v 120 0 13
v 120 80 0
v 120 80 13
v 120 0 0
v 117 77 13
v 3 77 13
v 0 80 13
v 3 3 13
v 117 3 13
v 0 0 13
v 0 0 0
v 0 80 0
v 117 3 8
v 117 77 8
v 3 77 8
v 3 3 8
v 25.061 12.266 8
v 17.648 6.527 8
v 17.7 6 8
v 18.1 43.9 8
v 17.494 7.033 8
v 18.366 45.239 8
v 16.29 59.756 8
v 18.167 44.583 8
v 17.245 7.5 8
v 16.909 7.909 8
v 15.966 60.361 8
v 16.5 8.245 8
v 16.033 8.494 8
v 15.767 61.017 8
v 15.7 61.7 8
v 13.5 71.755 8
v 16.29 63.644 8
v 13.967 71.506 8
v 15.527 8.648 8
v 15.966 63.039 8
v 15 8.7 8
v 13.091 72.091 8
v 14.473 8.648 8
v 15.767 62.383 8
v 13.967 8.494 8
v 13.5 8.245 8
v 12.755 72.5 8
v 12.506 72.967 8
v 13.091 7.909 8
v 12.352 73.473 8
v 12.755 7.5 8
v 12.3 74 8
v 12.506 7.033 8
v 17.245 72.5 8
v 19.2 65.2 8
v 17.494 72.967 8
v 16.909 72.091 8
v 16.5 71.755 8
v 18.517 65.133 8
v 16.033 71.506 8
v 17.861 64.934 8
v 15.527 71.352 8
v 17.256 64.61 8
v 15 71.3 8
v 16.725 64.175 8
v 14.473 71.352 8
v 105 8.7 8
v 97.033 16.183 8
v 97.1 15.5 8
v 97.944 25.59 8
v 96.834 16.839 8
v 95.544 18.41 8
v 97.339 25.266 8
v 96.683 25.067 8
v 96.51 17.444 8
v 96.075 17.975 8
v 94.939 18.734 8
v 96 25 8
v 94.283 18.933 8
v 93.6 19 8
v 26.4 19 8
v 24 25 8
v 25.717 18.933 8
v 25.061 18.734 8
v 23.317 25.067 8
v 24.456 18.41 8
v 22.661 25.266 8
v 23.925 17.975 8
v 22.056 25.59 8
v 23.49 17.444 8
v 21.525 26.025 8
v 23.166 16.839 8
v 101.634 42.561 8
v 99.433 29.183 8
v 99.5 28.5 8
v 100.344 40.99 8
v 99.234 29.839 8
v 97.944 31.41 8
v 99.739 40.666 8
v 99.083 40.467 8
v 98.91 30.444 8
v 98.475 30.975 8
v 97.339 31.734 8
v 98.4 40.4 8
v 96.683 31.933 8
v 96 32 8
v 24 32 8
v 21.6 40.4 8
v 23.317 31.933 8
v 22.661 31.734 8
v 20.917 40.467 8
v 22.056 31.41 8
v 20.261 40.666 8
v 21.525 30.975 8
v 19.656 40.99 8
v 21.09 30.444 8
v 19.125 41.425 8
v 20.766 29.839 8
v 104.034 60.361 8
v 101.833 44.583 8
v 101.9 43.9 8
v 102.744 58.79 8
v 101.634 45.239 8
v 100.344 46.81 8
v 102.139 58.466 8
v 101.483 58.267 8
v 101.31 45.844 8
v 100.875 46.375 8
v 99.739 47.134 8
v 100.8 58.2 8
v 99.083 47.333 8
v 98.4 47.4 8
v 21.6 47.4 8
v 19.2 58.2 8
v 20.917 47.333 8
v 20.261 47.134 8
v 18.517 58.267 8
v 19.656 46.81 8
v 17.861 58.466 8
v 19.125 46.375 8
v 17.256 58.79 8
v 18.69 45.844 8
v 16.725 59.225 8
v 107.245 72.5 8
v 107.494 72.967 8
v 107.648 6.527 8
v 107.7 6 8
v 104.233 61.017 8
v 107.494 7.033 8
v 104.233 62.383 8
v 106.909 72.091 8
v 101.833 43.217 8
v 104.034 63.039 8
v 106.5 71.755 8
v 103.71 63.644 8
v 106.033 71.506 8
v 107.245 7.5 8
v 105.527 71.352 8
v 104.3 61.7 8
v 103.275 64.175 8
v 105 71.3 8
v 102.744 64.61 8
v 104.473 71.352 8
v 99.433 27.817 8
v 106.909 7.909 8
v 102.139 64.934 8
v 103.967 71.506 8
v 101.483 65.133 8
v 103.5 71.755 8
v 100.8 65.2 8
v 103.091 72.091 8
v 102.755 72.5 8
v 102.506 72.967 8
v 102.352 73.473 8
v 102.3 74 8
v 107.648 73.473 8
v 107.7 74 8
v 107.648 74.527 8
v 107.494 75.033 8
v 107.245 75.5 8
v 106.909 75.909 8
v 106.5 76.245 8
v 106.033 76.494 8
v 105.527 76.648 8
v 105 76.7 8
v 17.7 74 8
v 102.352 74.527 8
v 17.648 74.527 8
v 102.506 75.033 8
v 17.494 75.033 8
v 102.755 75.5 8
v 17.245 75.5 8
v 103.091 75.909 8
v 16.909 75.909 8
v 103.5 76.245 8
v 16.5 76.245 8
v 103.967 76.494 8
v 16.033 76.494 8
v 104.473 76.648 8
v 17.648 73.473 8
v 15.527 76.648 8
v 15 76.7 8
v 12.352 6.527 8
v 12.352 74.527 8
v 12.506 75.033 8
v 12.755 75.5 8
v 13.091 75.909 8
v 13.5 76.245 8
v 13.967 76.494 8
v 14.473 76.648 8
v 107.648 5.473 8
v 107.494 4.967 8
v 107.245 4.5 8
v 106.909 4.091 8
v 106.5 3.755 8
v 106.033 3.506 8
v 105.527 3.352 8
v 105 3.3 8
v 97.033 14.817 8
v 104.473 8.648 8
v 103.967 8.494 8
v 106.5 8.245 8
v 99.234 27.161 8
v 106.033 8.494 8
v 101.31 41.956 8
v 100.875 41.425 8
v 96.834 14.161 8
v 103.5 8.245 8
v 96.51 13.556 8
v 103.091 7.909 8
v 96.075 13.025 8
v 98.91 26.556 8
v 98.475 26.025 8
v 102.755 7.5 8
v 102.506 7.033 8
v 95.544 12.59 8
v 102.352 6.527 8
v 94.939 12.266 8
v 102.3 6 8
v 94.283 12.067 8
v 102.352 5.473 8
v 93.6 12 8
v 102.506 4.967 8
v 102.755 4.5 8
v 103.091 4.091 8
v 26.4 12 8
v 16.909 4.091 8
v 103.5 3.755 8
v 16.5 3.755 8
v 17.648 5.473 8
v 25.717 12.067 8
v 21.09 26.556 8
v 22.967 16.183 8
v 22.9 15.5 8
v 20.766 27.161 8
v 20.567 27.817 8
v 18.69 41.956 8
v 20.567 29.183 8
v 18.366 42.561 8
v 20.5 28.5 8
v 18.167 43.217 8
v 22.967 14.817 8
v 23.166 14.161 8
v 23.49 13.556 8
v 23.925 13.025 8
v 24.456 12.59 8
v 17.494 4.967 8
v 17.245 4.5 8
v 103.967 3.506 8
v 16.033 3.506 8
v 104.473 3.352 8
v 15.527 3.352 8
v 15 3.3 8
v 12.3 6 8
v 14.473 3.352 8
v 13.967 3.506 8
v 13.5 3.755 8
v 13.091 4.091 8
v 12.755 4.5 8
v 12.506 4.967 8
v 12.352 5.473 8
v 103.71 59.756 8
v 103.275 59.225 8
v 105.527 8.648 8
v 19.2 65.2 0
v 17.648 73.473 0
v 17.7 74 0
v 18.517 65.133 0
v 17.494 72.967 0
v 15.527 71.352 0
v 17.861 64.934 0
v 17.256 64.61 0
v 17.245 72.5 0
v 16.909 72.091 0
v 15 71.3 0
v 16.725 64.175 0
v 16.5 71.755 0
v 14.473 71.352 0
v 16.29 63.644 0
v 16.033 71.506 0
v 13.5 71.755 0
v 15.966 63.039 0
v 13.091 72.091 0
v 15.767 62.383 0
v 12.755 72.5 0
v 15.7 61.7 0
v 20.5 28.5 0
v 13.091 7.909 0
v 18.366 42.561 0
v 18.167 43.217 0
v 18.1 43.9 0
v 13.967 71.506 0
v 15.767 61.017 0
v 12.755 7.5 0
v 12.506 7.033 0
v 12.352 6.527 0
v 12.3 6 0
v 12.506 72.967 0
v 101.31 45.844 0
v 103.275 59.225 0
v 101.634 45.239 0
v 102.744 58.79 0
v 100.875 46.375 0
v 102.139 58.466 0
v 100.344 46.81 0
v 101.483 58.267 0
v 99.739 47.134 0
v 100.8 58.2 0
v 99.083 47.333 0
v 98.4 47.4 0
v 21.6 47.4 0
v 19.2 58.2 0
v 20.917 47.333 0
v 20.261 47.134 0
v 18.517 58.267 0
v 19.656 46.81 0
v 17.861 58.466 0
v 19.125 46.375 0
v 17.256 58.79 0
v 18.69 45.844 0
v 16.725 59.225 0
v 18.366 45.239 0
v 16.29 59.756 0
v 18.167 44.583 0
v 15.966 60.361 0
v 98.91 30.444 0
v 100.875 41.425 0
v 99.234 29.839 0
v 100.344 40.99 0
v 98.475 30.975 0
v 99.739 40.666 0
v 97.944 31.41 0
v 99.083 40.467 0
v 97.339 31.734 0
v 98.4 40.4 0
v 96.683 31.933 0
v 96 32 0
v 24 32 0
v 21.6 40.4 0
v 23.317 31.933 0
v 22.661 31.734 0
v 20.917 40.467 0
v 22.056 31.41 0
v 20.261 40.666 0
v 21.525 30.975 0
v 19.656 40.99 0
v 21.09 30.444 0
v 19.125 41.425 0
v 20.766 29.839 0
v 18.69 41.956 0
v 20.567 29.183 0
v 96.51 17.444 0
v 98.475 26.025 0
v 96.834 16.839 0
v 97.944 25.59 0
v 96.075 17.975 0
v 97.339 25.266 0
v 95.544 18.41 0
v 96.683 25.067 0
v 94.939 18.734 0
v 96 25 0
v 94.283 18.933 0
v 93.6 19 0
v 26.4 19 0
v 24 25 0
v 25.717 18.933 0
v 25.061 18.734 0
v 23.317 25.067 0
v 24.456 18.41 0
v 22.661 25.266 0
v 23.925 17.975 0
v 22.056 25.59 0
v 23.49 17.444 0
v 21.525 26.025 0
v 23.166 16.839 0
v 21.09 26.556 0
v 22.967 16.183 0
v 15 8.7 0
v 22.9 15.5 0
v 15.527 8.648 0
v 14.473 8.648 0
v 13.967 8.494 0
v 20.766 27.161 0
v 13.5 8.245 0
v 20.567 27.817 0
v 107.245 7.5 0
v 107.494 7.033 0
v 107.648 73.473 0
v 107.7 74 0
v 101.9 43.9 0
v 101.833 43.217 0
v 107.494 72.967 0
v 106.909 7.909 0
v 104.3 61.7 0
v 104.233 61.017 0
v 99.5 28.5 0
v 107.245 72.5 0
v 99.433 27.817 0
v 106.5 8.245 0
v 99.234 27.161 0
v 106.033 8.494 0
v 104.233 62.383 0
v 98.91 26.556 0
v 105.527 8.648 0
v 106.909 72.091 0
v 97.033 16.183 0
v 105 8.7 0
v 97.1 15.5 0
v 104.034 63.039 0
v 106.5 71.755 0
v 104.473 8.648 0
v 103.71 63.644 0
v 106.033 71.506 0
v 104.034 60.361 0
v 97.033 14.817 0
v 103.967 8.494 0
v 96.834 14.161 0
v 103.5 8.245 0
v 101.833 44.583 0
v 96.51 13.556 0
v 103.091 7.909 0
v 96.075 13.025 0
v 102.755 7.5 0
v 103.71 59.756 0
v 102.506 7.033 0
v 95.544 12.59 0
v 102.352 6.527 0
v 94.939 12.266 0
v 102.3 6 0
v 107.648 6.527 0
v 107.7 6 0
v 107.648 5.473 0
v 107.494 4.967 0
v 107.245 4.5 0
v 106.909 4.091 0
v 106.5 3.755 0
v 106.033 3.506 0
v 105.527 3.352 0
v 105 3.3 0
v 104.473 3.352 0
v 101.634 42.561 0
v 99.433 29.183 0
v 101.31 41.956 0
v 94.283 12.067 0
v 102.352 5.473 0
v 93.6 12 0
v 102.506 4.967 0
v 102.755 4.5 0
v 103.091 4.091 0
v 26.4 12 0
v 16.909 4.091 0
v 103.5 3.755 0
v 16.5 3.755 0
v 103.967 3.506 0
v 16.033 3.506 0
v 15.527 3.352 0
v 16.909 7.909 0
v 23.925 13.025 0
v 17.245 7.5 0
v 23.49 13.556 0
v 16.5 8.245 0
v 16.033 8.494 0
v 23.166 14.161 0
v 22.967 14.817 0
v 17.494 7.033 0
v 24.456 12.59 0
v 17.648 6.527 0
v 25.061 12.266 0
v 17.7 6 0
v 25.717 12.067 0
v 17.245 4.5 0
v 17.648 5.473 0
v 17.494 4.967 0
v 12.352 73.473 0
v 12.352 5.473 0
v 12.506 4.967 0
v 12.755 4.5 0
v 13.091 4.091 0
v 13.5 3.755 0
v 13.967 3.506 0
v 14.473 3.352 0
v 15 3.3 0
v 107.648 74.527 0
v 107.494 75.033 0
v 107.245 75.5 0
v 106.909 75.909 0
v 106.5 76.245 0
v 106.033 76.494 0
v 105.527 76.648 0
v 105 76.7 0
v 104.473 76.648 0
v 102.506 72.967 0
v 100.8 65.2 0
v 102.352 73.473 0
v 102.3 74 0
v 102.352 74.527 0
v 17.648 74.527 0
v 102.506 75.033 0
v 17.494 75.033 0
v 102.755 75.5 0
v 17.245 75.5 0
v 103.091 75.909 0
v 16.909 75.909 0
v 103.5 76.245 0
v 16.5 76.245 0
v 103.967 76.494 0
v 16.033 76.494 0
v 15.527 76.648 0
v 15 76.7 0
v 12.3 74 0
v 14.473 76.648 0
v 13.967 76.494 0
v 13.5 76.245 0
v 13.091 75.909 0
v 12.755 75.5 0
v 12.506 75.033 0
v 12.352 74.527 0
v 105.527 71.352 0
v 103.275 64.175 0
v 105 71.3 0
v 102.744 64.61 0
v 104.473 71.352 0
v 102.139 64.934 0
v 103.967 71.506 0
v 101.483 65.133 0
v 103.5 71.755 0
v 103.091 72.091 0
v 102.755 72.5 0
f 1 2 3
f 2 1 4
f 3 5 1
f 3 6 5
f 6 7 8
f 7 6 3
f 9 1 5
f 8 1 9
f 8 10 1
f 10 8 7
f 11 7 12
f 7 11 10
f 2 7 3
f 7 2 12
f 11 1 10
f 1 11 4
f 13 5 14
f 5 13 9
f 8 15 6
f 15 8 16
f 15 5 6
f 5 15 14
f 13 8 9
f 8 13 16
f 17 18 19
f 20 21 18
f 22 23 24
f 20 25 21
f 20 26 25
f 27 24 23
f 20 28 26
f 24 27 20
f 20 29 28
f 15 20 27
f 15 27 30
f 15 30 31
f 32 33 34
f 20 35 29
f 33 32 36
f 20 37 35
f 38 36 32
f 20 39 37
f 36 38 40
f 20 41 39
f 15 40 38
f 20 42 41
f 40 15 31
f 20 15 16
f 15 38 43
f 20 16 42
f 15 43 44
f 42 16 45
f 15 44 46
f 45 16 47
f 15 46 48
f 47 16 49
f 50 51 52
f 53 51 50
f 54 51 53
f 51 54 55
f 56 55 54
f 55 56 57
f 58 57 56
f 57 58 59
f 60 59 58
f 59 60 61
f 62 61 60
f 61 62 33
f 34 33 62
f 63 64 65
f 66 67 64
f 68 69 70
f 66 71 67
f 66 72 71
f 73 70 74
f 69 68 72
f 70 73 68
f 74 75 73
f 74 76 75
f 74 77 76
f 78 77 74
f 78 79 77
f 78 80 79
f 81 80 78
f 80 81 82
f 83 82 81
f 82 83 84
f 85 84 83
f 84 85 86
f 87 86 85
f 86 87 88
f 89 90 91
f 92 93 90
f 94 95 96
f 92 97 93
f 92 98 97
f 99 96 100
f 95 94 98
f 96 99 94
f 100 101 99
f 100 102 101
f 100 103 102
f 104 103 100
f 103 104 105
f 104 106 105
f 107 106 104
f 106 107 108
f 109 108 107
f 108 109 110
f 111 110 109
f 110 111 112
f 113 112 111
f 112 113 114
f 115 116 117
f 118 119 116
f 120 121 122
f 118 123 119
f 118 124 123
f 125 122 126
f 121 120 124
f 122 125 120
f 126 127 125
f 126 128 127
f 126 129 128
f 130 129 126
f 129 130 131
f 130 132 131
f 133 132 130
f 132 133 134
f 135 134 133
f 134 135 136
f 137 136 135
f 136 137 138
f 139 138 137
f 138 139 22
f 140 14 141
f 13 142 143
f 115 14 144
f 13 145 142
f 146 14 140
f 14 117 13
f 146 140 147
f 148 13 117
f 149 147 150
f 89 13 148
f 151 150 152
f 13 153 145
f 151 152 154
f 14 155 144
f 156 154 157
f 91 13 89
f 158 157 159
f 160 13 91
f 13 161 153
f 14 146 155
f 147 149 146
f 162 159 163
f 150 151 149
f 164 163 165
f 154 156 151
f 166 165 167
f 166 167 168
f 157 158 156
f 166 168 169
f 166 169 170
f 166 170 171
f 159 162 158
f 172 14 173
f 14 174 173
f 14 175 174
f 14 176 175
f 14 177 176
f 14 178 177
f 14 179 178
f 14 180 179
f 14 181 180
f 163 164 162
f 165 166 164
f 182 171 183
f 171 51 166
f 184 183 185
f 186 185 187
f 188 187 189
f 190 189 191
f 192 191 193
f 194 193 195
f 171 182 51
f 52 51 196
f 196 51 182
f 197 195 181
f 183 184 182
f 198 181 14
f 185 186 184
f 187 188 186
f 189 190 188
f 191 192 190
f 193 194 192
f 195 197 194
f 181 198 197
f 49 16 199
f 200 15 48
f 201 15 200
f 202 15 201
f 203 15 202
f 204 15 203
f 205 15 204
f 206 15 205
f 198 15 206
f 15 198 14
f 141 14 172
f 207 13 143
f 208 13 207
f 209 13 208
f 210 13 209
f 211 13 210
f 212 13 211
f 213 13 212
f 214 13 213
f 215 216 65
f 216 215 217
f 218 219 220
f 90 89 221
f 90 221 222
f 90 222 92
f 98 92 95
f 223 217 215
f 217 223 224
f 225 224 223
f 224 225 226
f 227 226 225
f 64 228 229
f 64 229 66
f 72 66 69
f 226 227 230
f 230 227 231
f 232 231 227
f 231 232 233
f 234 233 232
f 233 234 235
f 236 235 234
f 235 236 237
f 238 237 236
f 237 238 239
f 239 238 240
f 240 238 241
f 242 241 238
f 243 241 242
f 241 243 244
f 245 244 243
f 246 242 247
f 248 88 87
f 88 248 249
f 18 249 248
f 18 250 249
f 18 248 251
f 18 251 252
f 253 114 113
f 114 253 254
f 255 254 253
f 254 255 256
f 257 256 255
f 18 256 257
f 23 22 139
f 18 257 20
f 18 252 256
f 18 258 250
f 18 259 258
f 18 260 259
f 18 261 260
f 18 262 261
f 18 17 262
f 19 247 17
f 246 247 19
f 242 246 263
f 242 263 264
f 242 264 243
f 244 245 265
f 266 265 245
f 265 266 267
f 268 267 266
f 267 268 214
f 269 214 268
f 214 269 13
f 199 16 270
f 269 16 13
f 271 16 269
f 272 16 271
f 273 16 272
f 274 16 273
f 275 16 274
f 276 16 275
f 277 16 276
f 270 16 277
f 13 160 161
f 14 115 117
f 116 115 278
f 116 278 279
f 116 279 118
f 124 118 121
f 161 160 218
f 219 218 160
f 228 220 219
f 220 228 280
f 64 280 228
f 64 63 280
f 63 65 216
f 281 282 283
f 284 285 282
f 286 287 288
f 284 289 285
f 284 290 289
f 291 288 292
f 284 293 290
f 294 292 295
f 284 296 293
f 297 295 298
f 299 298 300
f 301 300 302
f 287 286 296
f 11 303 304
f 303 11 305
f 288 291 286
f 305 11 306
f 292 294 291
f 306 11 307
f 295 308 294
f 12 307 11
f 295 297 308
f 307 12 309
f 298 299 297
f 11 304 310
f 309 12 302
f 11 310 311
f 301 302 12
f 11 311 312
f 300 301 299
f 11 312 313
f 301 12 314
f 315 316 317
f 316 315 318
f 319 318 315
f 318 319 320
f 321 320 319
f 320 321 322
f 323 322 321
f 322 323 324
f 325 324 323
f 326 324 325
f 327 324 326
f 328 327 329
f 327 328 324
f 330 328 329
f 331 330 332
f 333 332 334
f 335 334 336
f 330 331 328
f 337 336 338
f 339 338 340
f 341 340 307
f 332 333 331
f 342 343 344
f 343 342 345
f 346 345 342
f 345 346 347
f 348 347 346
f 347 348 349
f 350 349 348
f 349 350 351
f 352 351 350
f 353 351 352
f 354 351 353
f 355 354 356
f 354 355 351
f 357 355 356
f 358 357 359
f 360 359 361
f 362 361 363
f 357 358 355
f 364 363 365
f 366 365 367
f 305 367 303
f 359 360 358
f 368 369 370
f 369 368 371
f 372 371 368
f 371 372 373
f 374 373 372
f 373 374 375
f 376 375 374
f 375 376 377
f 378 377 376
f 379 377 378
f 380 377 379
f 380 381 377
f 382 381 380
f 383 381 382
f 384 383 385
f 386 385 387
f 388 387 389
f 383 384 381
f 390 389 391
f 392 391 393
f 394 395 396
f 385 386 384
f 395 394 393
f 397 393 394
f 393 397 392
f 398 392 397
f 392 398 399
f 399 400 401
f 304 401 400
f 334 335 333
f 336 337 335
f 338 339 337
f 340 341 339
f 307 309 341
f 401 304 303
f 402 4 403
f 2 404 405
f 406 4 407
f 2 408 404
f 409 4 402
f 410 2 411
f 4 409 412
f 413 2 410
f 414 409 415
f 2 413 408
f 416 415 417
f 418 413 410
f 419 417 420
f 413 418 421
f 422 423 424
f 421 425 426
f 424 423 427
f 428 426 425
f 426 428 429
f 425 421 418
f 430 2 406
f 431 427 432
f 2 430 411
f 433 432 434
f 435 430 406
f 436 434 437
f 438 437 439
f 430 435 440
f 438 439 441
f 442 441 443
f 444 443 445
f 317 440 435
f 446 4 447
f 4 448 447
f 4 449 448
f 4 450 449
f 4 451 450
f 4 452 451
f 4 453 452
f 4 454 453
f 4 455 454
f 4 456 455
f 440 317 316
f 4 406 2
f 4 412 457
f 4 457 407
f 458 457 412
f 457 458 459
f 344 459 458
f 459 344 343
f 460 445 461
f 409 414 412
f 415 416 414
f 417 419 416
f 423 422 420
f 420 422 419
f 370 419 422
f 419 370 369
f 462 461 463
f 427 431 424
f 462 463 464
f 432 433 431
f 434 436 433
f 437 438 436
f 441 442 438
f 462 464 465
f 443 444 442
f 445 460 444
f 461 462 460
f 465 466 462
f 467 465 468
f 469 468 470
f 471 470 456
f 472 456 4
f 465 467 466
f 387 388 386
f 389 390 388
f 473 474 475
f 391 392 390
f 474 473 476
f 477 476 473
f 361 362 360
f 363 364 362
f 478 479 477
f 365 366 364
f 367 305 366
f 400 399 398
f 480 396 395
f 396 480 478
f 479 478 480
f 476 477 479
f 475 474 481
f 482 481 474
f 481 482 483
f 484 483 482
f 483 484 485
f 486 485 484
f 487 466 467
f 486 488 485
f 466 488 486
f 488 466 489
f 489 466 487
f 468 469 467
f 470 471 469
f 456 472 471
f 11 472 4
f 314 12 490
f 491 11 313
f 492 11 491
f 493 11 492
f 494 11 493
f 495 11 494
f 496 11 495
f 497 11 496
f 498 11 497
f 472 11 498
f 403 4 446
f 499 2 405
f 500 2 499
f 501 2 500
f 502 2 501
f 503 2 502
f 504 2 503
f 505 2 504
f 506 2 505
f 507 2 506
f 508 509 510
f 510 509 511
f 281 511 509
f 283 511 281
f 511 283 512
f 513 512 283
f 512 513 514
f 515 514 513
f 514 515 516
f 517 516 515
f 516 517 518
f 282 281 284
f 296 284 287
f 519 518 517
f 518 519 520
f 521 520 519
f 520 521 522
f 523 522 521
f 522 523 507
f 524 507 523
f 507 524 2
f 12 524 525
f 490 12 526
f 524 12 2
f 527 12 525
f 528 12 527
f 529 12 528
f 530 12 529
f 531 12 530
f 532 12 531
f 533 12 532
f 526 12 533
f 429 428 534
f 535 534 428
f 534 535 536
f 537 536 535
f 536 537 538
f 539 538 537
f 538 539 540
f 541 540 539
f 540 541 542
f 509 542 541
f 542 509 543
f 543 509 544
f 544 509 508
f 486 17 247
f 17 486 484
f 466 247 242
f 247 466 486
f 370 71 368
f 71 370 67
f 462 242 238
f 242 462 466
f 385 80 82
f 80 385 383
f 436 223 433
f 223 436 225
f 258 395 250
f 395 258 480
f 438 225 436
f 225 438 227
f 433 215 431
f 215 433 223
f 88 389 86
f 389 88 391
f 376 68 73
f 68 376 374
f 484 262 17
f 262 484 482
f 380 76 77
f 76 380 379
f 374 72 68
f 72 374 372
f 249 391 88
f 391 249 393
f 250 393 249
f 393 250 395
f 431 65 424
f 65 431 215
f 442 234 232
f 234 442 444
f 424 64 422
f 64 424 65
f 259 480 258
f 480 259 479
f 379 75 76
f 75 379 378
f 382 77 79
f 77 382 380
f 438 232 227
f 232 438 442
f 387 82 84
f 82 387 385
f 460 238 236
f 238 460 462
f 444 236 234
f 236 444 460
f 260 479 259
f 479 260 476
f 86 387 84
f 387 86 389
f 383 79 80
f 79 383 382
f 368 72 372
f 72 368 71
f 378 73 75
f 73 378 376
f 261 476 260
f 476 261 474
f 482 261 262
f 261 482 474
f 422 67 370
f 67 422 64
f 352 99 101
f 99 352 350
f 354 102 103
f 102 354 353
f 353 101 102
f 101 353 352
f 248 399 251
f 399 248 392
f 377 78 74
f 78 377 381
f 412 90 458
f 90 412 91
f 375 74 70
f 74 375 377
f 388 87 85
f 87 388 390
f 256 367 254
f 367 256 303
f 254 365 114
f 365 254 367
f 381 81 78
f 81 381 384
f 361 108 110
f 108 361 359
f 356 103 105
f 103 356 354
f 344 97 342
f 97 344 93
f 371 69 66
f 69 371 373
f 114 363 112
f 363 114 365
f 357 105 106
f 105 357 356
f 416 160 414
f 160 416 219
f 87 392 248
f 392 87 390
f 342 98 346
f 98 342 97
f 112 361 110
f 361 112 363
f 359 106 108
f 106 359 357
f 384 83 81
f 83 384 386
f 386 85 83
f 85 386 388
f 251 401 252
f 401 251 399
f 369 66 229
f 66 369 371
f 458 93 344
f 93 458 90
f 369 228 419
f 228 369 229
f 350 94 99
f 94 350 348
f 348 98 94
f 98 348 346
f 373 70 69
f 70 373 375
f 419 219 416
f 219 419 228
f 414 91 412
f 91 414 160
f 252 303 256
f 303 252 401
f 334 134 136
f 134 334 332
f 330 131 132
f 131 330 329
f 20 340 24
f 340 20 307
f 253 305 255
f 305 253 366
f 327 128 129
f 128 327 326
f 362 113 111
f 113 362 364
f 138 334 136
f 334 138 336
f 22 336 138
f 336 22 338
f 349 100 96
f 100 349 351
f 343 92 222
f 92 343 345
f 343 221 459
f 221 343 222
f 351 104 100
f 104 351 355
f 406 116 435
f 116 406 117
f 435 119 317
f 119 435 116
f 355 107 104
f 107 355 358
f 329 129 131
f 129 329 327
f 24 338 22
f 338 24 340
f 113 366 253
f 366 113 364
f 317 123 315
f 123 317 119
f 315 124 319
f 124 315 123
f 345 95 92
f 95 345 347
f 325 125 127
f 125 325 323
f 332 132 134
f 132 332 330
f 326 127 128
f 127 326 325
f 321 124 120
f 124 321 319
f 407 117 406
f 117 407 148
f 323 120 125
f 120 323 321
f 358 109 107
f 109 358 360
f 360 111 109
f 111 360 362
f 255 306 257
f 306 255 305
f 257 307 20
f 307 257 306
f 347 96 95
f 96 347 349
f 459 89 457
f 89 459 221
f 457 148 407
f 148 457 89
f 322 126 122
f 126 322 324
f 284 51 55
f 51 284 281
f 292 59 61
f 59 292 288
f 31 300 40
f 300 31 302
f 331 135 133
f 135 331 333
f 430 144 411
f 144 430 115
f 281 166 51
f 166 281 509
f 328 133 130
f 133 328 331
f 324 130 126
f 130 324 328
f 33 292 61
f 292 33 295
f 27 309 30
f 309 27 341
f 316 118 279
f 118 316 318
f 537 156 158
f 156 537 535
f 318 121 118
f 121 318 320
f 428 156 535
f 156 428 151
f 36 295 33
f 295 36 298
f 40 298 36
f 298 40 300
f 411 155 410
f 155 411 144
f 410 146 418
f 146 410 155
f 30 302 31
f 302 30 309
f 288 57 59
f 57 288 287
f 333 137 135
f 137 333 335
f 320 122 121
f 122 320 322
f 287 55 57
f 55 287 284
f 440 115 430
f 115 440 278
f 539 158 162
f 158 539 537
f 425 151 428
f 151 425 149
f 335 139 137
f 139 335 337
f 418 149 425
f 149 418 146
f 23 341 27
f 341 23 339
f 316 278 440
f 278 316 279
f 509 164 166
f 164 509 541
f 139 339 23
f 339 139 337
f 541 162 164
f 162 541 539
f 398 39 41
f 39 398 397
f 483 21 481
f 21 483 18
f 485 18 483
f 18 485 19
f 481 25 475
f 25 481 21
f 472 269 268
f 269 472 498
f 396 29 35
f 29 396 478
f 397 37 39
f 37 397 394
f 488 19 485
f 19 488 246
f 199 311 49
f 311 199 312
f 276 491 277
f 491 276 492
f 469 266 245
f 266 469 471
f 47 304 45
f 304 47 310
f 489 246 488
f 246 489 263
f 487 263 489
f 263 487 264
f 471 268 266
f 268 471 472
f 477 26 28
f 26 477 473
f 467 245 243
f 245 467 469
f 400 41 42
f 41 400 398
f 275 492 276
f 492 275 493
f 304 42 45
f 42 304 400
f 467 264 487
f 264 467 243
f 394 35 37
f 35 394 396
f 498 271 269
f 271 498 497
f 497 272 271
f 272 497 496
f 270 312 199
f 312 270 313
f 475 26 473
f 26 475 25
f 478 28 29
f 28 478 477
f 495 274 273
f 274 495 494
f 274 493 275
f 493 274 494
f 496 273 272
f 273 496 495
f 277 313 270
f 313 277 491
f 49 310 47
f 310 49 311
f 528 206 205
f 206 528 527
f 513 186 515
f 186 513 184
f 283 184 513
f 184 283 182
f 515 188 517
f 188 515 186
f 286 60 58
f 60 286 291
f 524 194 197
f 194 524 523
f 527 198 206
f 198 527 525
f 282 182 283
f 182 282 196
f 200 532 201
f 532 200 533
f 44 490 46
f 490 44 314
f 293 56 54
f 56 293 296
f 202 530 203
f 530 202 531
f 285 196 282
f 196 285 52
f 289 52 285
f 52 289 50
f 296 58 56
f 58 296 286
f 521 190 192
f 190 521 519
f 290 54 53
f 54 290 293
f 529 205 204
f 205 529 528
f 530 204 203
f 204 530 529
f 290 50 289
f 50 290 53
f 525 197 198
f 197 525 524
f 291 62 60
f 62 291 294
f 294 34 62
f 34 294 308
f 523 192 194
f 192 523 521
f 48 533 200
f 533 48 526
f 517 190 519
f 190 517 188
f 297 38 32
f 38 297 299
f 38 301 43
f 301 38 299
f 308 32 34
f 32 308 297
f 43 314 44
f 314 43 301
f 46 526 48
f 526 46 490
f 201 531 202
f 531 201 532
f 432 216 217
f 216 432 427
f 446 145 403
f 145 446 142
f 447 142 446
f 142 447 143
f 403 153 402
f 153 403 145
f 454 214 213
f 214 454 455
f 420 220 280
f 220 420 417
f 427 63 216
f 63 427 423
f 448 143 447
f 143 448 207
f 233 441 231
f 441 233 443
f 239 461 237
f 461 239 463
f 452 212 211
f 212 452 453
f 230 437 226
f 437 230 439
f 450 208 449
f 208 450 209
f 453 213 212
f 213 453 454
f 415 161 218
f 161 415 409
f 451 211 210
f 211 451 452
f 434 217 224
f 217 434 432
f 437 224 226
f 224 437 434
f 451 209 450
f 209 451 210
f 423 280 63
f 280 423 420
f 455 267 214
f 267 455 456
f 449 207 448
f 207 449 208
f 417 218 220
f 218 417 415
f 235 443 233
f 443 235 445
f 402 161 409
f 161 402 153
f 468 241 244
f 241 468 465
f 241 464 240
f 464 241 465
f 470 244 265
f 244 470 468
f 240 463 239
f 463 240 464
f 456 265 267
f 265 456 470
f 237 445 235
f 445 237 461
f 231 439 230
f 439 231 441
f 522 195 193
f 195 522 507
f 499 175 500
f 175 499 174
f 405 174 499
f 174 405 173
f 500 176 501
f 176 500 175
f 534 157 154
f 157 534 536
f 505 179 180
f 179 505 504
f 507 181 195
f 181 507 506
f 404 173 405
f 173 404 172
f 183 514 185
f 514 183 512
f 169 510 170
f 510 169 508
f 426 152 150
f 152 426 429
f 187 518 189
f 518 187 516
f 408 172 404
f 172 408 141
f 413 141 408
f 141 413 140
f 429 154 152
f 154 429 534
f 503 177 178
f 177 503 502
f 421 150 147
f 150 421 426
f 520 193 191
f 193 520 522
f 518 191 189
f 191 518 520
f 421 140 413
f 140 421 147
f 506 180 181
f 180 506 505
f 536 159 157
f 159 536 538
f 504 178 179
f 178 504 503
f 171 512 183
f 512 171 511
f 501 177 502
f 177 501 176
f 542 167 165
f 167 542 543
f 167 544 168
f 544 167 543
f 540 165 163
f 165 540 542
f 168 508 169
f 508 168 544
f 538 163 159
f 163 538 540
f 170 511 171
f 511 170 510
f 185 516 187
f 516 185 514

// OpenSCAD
$fn = 32;

// ----------------------------------------------------------------------
// Slotted panel: 120 x 80 mm, 4 ряда of slots
// ----------------------------------------------------------------------

// --- parameters (mm) ---
panel_w = 120;            // panel width
panel_d = 80;             // panel depth
thick = 8;                // panel thickness
slot_w = 7;               // slot width
pitch0 = 13;              // first row pitch
pitch_step = 2.4;         // pitch increase per row
margin = 12;              // margin around the slot field
rows = 4;                 // number of slot rows
mount_d = 5.4;            // mounting holes
mount_x = 45;             // mounting hole offset
rim_h = 13;               // rim height
rim_t = 3;                // rim wall thickness

difference() {
  union() {
    cube([panel_w, panel_d, thick]);
    translate([0, 0, thick - 1]) difference() {
      cube([panel_w, panel_d, rim_h - thick + 1]);
      translate([rim_t, rim_t, -2.5]) cube([panel_w - 2 * rim_t, panel_d - 2 * rim_t, rim_h - thick + 6]);
    }
  }
  /* slot rows: stadium shaped cutters, 2.5 mm clear of both faces */
  /* row 0: pitch 13, length 67.2 */
  hull() {
    translate([26.4, 15.5, -2.5]) cylinder(h = thick + 5, d = slot_w);
    translate([93.6, 15.5, -2.5]) cylinder(h = thick + 5, d = slot_w);
  }
  /* row 1: pitch 15.4, length 72 */
  hull() {
    translate([24, 28.5, -2.5]) cylinder(h = thick + 5, d = slot_w);
    translate([96, 28.5, -2.5]) cylinder(h = thick + 5, d = slot_w);
  }
  /* row 2: pitch 17.8, length 76.8 */
  hull() {
    translate([21.6, 43.9, -2.5]) cylinder(h = thick + 5, d = slot_w);
    translate([98.4, 43.9, -2.5]) cylinder(h = thick + 5, d = slot_w);
  }
  /* row 3: pitch 20.2, length 81.6 */
  hull() {
    translate([19.2, 61.7, -2.5]) cylinder(h = thick + 5, d = slot_w);
    translate([100.8, 61.7, -2.5]) cylinder(h = thick + 5, d = slot_w);
  }
  translate([15, 6, -2.5]) cylinder(h = 18, d = mount_d);
  translate([15, 74, -2.5]) cylinder(h = 18, d = mount_d);
  translate([105, 6, -2.5]) cylinder(h = 18, d = mount_d);
  translate([105, 74, -2.5]) cylinder(h = 18, d = mount_d);
}
